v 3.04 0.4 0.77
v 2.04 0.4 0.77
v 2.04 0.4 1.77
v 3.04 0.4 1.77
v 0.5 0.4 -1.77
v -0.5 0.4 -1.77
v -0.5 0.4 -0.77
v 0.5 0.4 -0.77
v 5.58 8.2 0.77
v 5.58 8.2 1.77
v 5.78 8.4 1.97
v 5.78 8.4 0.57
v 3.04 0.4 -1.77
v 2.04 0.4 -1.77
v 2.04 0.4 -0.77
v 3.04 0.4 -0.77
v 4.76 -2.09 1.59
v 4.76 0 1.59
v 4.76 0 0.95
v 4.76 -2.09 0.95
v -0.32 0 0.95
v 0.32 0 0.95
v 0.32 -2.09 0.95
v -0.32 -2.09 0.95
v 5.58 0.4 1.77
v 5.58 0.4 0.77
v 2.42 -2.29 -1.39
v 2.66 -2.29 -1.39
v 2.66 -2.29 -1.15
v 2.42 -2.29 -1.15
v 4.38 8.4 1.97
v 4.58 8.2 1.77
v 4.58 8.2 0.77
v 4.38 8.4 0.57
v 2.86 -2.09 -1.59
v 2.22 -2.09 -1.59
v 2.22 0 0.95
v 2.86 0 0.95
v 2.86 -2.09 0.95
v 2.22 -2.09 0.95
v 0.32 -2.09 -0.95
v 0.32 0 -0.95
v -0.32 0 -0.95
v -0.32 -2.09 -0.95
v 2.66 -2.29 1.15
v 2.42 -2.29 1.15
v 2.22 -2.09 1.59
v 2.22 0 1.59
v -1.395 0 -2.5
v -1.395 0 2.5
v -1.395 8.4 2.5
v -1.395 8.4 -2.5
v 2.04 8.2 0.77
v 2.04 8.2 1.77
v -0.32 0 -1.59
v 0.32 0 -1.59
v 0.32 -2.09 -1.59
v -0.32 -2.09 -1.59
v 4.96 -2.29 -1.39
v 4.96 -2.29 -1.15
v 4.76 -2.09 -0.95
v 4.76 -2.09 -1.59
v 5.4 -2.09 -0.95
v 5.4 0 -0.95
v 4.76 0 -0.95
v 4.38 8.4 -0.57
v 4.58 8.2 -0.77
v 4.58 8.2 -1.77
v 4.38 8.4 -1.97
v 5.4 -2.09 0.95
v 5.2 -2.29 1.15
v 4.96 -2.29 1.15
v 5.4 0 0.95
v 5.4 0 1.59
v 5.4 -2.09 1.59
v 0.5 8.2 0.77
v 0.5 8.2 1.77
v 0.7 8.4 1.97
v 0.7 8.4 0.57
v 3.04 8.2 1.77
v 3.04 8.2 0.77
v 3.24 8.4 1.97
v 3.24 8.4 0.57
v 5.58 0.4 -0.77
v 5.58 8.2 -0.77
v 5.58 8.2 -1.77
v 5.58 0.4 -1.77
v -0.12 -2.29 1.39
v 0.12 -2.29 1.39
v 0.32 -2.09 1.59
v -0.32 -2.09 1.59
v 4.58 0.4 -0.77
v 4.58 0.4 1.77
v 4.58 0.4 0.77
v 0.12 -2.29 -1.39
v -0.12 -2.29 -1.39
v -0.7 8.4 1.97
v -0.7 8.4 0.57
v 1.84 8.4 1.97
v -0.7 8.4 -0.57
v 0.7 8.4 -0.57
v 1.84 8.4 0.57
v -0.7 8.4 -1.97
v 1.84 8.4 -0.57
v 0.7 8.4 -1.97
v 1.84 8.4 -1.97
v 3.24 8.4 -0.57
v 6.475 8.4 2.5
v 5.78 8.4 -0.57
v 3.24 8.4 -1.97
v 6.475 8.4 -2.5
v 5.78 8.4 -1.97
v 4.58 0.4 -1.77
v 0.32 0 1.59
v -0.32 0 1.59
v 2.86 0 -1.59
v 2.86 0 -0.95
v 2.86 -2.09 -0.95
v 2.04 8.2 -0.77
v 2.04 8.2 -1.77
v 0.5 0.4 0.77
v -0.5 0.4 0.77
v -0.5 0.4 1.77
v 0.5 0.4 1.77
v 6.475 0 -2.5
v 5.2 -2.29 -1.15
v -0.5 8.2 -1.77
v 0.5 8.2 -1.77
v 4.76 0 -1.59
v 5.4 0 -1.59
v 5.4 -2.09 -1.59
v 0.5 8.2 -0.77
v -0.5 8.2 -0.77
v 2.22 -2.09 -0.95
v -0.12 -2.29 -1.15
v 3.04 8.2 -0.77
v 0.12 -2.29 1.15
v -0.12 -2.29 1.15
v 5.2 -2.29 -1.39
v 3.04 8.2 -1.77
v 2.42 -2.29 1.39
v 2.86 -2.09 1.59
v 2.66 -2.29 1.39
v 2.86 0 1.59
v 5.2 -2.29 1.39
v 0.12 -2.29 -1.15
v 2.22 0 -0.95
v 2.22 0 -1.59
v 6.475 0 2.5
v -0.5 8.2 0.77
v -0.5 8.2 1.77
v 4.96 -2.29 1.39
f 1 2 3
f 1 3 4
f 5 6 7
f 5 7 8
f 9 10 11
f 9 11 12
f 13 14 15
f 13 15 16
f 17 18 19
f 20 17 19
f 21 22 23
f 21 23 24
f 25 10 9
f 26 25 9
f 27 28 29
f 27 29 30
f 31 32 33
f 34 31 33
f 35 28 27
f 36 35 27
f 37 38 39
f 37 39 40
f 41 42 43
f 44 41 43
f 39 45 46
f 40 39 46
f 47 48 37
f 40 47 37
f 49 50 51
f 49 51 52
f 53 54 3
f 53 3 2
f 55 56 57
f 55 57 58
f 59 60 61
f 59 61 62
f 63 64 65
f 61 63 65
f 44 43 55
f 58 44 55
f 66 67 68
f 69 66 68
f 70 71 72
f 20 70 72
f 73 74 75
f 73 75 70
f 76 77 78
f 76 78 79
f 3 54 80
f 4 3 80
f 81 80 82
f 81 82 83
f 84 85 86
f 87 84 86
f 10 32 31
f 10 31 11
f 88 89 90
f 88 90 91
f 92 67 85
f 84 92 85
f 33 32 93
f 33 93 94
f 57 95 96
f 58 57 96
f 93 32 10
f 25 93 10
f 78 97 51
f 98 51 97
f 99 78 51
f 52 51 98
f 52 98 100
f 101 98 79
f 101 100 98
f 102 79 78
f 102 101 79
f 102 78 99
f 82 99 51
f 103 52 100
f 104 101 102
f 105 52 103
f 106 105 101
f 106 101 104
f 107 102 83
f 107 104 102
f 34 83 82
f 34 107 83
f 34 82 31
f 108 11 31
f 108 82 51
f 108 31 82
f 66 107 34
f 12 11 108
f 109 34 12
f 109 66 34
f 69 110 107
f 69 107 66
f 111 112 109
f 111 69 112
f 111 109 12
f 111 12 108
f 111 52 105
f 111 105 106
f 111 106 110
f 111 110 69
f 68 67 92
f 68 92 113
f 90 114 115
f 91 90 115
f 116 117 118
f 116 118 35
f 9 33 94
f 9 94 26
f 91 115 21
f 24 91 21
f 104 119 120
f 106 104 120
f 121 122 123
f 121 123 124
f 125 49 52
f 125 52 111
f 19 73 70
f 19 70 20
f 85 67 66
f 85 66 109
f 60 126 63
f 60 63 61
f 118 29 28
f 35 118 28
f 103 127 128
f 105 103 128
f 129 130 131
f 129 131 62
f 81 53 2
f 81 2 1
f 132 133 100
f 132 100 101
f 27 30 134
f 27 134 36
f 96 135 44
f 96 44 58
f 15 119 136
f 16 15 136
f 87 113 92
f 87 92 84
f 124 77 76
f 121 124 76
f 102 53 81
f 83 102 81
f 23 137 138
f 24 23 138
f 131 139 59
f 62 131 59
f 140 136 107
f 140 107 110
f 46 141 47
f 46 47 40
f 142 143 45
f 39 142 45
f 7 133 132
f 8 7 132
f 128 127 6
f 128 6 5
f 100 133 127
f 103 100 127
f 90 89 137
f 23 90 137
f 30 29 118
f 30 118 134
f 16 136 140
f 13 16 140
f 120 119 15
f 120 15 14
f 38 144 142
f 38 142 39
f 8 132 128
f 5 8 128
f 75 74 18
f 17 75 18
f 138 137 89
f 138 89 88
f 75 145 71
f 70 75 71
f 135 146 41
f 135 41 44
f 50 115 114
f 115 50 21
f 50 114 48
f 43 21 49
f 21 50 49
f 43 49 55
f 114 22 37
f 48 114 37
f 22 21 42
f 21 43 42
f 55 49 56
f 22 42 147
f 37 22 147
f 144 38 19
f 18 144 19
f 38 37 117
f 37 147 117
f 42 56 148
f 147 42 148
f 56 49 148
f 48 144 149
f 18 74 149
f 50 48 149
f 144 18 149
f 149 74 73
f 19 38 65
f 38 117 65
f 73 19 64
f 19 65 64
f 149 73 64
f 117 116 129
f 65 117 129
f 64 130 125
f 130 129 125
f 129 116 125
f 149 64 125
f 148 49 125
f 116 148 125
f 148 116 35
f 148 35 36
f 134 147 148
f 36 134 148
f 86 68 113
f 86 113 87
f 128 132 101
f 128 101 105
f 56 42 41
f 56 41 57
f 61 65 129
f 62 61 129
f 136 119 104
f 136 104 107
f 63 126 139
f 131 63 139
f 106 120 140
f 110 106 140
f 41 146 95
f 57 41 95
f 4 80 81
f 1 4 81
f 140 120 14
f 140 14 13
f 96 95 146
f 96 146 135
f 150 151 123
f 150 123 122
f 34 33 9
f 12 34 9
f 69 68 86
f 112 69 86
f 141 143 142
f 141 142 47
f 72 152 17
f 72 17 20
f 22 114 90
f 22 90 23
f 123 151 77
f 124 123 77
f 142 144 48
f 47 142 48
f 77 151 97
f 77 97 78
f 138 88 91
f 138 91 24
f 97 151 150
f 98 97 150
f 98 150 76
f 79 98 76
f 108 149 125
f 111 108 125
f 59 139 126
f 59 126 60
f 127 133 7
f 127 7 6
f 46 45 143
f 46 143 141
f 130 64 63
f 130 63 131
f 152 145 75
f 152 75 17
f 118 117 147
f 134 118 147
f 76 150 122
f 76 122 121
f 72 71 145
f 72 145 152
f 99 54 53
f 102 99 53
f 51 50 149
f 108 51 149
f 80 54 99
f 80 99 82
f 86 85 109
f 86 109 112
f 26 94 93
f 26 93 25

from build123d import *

# Parameters (mm, degrees)
SKETCH_1_W                         = 2.79
SKETCH_1_H                         = 5
EXTRUDE_1_DEPTH                    = 8.4
SKETCH_2_W                         = 1
SKETCH_2_H                         = 1
CUT_EXTRUDE_1_DEPTH                = 8
CHAMFER_1_SIZE                     = 0.2
SKETCH_3_W                         = 0.64
SKETCH_3_H                         = 0.64
EXTRUDE_2_DEPTH                    = 2.29
CHAMFER_2_SIZE                     = 0.2
PATTERN_LINEAR_1_COUNT             = 3
PATTERN_LINEAR_1_PITCH             = 2.54
CHAMFER_1_OF_PATTERN_LINEAR_1_SIZE = 0.2
CHAMFER_2_OF_PATTERN_LINEAR_1_SIZE = 0.2


with BuildPart() as part:
    # Эскиз1 → Бобышка-Вытянуть1 (new body)
    with BuildSketch(Plane(origin=(0, 0, 0), x_dir=(1, 0, 0), z_dir=(0, 1, 0))):
        Rectangle(SKETCH_1_W, SKETCH_1_H)
    extrude_1 = extrude(amount=EXTRUDE_1_DEPTH)

    # Эскиз2 → Вырез-Вытянуть1 (cut)
    with BuildSketch(Plane(origin=(0, 8.4, 0), x_dir=(1, 0, 0), z_dir=(0, 1, 0))):
        with Locations((0, 1.27)):
            Rectangle(SKETCH_2_W, SKETCH_2_H)
        with Locations((0, -1.27)):
            Rectangle(SKETCH_2_W, SKETCH_2_H)
    cut_extrude_1 = extrude(amount=-CUT_EXTRUDE_1_DEPTH, mode=Mode.SUBTRACT)

    # Фаска1
    chamfer_1_edges = [part.edges().sort_by_distance(p)[0] for p in [
        (0.5, 8.4, -1.27),
        (0, 8.4, -1.77),
        (-0.5, 8.4, -1.27),
        (0, 8.4, -0.77),
        (0, 8.4, 1.77),
        (0.5, 8.4, 1.27),
        (0, 8.4, 0.77),
        (-0.5, 8.4, 1.27),
    ]]
    chamfer(chamfer_1_edges, length=CHAMFER_1_SIZE)

    # Эскиз3 → Бобышка-Вытянуть2 (add)
    with BuildSketch(Plane(origin=(0, 0, 0), x_dir=(-1, 0, 0), z_dir=(0, -1, 0))):
        with Locations((0, 1.27)):
            Rectangle(SKETCH_3_W, SKETCH_3_H)
        with Locations((0, -1.27)):
            Rectangle(SKETCH_3_W, SKETCH_3_H)
    extrude_2 = extrude(amount=EXTRUDE_2_DEPTH)

    # Фаска2
    chamfer_2_edges = [part.edges().sort_by_distance(p)[0] for p in [
        (0.32, -2.29, -1.27),
        (0, -2.29, -0.95),
        (-0.32, -2.29, -1.27),
        (0, -2.29, -1.59),
        (-0.32, -2.29, 1.27),
        (0, -2.29, 0.95),
        (0.32, -2.29, 1.27),
        (0, -2.29, 1.59),
    ]]
    chamfer(chamfer_2_edges, length=CHAMFER_2_SIZE)

    # Линейный массив1: Бобышка-Вытянуть1, Вырез-Вытянуть1, Бобышка-Вытянуть2 ×3
    with Locations(*[(i * PATTERN_LINEAR_1_PITCH, 0, 0) for i in range(1, PATTERN_LINEAR_1_COUNT)]):
        add(extrude_1)
        add(cut_extrude_1, mode=Mode.SUBTRACT)
        add(extrude_2)

    # Фаска1 of Линейный массив1
    chamfer_1_of_pattern_linear_1_edges = [part.edges().sort_by_distance(p)[0] for p in [
        (3.04, 8.4, -1.27),
        (2.54, 8.4, -1.77),
        (2.04, 8.4, -1.27),
        (2.54, 8.4, -0.77),
        (2.54, 8.4, 1.77),
        (3.04, 8.4, 1.27),
        (2.54, 8.4, 0.77),
        (2.04, 8.4, 1.27),
        (5.58, 8.4, -1.27),
        (5.08, 8.4, -1.77),
        (4.58, 8.4, -1.27),
        (5.08, 8.4, -0.77),
        (5.08, 8.4, 1.77),
        (5.58, 8.4, 1.27),
        (5.08, 8.4, 0.77),
        (4.58, 8.4, 1.27),
    ]]
    chamfer(chamfer_1_of_pattern_linear_1_edges, length=CHAMFER_1_OF_PATTERN_LINEAR_1_SIZE)

    # Фаска2 of Линейный массив1
    chamfer_2_of_pattern_linear_1_edges = [part.edges().sort_by_distance(p)[0] for p in [
        (2.86, -2.29, -1.27),
        (2.54, -2.29, -0.95),
        (2.22, -2.29, -1.27),
        (2.54, -2.29, -1.59),
        (2.22, -2.29, 1.27),
        (2.54, -2.29, 0.95),
        (2.86, -2.29, 1.27),
        (2.54, -2.29, 1.59),
        (5.4, -2.29, -1.27),
        (5.08, -2.29, -0.95),
        (4.76, -2.29, -1.27),
        (5.08, -2.29, -1.59),
        (4.76, -2.29, 1.27),
        (5.08, -2.29, 0.95),
        (5.4, -2.29, 1.27),
        (5.08, -2.29, 1.59),
    ]]
    chamfer(chamfer_2_of_pattern_linear_1_edges, length=CHAMFER_2_OF_PATTERN_LINEAR_1_SIZE)


solid = part.part
